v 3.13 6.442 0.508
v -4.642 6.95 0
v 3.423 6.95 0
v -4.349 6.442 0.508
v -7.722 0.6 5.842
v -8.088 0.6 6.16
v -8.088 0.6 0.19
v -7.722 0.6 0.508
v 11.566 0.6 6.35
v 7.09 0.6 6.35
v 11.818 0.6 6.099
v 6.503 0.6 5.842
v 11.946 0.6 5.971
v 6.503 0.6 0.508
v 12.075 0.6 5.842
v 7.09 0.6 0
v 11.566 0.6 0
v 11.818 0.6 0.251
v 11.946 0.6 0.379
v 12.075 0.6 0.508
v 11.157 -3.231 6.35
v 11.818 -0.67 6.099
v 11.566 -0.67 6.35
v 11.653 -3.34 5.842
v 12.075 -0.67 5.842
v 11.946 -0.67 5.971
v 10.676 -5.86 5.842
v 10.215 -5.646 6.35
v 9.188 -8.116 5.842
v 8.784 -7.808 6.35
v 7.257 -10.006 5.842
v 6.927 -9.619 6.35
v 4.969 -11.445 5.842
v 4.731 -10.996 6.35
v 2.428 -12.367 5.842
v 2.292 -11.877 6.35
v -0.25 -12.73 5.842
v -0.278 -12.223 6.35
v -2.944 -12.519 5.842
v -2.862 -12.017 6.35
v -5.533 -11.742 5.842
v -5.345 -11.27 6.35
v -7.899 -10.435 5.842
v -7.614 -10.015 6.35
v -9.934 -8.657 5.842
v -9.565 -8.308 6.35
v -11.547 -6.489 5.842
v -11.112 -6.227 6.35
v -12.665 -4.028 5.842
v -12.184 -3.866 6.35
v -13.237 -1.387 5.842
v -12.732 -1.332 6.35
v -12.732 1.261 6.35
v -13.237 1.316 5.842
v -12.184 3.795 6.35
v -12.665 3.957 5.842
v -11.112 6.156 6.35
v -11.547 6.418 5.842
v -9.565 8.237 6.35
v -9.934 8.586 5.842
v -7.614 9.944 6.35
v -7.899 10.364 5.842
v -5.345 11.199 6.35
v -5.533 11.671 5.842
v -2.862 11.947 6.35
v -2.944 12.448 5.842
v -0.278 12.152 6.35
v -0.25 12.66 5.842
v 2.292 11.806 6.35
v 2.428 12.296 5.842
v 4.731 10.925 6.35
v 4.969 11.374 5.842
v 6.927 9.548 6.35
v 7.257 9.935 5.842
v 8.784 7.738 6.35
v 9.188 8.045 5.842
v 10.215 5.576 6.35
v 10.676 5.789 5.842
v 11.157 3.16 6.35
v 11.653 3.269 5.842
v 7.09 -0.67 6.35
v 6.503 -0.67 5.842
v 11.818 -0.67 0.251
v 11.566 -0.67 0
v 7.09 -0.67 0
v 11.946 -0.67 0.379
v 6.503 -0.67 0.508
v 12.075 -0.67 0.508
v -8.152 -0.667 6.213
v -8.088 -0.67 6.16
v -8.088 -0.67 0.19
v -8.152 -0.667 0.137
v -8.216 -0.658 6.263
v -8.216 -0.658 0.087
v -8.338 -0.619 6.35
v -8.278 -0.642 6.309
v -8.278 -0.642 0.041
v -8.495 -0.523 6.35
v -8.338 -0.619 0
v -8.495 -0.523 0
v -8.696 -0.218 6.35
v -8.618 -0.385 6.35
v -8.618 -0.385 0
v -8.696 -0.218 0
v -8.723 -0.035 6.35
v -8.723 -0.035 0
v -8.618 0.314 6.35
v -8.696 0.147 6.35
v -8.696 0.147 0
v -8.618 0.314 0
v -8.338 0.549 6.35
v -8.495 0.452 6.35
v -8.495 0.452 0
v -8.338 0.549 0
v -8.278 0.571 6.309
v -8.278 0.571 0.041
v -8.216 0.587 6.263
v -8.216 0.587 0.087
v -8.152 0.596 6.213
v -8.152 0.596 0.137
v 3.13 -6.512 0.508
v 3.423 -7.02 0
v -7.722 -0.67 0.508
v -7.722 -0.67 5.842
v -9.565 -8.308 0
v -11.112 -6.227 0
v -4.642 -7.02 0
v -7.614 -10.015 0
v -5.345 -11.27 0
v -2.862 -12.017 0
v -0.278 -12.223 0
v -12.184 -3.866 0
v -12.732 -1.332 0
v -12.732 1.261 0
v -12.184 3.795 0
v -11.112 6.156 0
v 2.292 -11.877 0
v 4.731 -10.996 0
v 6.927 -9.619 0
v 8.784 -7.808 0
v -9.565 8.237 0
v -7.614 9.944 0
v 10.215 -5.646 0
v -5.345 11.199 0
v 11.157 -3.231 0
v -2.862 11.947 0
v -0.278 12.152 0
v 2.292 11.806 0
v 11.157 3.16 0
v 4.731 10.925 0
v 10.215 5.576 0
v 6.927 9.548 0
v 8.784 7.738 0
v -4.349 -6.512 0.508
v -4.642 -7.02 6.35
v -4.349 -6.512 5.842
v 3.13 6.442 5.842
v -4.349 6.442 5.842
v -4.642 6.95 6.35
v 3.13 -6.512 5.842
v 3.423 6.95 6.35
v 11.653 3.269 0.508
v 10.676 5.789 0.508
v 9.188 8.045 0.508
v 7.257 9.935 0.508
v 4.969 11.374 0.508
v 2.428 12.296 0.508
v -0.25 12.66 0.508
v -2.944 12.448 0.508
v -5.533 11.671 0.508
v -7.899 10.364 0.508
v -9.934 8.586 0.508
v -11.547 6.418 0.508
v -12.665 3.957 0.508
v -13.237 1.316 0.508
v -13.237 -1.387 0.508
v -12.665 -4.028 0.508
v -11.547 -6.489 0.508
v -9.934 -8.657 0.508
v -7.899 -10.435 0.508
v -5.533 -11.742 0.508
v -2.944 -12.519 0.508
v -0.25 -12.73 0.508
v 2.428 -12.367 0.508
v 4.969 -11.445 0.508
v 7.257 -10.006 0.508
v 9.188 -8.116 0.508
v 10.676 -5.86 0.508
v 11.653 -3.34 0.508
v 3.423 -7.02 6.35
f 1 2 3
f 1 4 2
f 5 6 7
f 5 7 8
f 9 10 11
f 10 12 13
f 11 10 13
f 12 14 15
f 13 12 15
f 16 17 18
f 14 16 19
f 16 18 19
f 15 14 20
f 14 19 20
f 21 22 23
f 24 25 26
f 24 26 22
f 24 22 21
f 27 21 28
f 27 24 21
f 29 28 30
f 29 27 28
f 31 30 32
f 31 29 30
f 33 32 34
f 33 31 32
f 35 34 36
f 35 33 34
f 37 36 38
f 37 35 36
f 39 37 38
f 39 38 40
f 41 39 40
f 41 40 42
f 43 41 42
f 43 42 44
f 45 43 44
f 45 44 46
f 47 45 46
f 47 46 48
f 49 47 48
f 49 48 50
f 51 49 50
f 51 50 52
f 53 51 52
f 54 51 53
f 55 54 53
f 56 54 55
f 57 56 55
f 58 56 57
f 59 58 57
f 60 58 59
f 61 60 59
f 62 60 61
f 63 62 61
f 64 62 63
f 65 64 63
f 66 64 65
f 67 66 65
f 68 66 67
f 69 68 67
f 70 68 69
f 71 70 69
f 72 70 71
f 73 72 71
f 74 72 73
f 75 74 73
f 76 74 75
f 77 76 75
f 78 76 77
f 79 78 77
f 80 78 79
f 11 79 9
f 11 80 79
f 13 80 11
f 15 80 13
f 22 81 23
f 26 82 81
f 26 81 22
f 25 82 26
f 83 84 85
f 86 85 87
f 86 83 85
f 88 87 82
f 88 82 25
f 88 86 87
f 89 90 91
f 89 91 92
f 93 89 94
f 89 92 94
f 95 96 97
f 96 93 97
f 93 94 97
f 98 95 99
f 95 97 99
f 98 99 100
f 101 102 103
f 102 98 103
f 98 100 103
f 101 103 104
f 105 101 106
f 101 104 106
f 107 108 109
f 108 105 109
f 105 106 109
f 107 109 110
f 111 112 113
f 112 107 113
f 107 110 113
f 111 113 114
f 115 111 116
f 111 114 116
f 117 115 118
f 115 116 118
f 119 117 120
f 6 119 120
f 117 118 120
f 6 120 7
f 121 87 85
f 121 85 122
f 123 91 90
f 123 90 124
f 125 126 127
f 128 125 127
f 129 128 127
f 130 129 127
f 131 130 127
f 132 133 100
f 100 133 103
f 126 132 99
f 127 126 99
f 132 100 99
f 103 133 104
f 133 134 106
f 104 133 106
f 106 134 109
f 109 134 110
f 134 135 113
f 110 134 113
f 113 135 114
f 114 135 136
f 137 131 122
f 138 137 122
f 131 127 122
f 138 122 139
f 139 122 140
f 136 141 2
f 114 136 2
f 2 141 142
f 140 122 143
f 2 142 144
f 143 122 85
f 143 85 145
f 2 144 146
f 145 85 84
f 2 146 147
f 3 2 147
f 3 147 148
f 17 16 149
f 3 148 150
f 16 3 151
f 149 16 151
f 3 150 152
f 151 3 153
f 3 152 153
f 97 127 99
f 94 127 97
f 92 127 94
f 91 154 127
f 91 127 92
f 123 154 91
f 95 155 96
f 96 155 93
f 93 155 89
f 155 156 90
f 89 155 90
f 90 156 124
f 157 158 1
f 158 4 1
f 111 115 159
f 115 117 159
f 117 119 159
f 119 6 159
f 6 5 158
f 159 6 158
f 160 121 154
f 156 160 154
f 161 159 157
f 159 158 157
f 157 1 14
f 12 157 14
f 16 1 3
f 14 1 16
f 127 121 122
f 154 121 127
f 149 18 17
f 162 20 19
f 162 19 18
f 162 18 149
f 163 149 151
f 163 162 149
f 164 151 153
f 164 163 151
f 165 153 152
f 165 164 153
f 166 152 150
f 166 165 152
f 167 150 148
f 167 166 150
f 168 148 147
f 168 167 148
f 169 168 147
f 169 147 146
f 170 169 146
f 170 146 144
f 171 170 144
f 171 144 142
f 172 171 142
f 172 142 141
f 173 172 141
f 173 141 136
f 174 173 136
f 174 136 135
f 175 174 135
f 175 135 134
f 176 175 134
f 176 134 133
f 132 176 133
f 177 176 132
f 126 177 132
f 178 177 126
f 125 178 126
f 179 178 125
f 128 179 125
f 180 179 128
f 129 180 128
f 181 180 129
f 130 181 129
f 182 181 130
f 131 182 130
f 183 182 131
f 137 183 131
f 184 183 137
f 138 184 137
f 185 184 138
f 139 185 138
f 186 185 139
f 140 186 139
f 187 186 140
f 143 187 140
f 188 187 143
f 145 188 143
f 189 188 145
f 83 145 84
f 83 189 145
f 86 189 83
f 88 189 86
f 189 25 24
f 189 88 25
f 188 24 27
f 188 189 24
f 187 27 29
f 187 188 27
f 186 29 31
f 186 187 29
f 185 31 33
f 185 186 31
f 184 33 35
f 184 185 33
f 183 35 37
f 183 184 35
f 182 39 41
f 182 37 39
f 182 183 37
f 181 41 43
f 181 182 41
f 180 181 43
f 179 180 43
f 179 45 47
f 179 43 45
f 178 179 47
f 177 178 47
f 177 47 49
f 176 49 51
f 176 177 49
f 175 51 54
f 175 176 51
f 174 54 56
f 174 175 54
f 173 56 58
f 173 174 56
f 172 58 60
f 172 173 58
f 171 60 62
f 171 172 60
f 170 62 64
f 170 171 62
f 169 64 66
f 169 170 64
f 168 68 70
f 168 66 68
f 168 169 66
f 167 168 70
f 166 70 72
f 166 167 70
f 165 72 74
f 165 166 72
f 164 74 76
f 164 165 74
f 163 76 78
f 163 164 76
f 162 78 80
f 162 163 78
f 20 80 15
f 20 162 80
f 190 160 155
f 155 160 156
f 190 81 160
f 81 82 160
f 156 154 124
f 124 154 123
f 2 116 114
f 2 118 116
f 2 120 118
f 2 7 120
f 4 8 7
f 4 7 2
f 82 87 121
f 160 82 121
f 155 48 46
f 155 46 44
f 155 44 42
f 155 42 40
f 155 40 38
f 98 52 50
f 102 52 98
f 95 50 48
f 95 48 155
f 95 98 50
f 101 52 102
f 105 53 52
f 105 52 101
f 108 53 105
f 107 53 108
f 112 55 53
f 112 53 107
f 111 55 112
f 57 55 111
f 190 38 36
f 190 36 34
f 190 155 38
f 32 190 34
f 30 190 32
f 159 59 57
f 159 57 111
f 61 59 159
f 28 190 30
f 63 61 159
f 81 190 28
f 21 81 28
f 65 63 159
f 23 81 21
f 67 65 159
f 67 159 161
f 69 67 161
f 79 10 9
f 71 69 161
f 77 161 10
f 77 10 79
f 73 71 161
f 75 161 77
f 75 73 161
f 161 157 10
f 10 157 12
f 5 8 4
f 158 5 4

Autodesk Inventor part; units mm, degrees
ref_plane "YZ Plane" through (0, 0, 0) normal (1, 0, 0) x (0, 1, 0)
ref_plane "XZ Plane" through (0, 0, 0) normal (0, 1, 0) x (-1, 0, 0)
ref_plane "XY Plane" through (0, 0, 0) normal (0, 0, 1) x (1, 0, 0)
sketch "Sketch1" plane through (0, 0, 0) normal (0, 0, 1) x (1, 0, 0)
  line L0 (-4.3488, 6.4416) -> (3.1302, 6.4416)
  line L1 (3.1302, 6.4416) -> (6.503, 0.5996)
  line L2 (6.503, -0.6704) -> (3.1302, -6.5124)
  line L3 (3.1302, -6.5124) -> (-4.3488, -6.5124)
  line L4 (-4.3488, -6.5124) -> (-7.7708, -0.5853)
  line L5 (-7.7708, 0.5145) -> (-4.3488, 6.4416)
  arc A0 (12.0748, 0.5996) -> (12.0748, -0.6704) centre (-0.6093, -0.0354) ccw
  arc A1 (-8.0883, 0.5996) -> (-8.0883, -0.6704) centre (-8.0883, -0.0354) ccw
  line L6 (-8.0883, 0.5996) -> (-7.7217, 0.5996)
  line L7 (6.503, 0.5996) -> (12.0748, 0.5996)
  line L8 (-8.0883, -0.6704) -> (-7.7217, -0.6704)
  line L9 (6.503, -0.6704) -> (12.0748, -0.6704)
  point P0 (-0.6093, 6.4416)
  dimension "d2" = 12.954
  dimension "d3" = 25.4
  dimension "d4" = 1.27
extrude "Extrusion1" add sketch "Sketch1" along normal blind 6.35
chamfer "Chamfer1" distance 0.508 angle 45 2 edges at (-13.3093, -0.0354, 6.35) (-13.3093, -0.0354, 0)
chamfer "Chamfer2" distance 0.508 angle 45 12 edges at (-6.0353, 3.5206, 6.35) (-0.6093, 6.4416, 6.35) (4.8166, 3.5206, 6.35) (4.8166, -3.5914, 6.35) (-0.6093, -6.5124, 6.35) (-6.0353, -3.5914, 6.35) (-6.0353, -3.5914, 0) (-6.0353, 3.5206, 0) (-0.6093, -6.5124, 0) (4.8166, -3.5914, 0) (4.8166, 3.5206, 0) (-0.6093, 6.4416, 0)
properties part number "Hex Shaft Collar"
